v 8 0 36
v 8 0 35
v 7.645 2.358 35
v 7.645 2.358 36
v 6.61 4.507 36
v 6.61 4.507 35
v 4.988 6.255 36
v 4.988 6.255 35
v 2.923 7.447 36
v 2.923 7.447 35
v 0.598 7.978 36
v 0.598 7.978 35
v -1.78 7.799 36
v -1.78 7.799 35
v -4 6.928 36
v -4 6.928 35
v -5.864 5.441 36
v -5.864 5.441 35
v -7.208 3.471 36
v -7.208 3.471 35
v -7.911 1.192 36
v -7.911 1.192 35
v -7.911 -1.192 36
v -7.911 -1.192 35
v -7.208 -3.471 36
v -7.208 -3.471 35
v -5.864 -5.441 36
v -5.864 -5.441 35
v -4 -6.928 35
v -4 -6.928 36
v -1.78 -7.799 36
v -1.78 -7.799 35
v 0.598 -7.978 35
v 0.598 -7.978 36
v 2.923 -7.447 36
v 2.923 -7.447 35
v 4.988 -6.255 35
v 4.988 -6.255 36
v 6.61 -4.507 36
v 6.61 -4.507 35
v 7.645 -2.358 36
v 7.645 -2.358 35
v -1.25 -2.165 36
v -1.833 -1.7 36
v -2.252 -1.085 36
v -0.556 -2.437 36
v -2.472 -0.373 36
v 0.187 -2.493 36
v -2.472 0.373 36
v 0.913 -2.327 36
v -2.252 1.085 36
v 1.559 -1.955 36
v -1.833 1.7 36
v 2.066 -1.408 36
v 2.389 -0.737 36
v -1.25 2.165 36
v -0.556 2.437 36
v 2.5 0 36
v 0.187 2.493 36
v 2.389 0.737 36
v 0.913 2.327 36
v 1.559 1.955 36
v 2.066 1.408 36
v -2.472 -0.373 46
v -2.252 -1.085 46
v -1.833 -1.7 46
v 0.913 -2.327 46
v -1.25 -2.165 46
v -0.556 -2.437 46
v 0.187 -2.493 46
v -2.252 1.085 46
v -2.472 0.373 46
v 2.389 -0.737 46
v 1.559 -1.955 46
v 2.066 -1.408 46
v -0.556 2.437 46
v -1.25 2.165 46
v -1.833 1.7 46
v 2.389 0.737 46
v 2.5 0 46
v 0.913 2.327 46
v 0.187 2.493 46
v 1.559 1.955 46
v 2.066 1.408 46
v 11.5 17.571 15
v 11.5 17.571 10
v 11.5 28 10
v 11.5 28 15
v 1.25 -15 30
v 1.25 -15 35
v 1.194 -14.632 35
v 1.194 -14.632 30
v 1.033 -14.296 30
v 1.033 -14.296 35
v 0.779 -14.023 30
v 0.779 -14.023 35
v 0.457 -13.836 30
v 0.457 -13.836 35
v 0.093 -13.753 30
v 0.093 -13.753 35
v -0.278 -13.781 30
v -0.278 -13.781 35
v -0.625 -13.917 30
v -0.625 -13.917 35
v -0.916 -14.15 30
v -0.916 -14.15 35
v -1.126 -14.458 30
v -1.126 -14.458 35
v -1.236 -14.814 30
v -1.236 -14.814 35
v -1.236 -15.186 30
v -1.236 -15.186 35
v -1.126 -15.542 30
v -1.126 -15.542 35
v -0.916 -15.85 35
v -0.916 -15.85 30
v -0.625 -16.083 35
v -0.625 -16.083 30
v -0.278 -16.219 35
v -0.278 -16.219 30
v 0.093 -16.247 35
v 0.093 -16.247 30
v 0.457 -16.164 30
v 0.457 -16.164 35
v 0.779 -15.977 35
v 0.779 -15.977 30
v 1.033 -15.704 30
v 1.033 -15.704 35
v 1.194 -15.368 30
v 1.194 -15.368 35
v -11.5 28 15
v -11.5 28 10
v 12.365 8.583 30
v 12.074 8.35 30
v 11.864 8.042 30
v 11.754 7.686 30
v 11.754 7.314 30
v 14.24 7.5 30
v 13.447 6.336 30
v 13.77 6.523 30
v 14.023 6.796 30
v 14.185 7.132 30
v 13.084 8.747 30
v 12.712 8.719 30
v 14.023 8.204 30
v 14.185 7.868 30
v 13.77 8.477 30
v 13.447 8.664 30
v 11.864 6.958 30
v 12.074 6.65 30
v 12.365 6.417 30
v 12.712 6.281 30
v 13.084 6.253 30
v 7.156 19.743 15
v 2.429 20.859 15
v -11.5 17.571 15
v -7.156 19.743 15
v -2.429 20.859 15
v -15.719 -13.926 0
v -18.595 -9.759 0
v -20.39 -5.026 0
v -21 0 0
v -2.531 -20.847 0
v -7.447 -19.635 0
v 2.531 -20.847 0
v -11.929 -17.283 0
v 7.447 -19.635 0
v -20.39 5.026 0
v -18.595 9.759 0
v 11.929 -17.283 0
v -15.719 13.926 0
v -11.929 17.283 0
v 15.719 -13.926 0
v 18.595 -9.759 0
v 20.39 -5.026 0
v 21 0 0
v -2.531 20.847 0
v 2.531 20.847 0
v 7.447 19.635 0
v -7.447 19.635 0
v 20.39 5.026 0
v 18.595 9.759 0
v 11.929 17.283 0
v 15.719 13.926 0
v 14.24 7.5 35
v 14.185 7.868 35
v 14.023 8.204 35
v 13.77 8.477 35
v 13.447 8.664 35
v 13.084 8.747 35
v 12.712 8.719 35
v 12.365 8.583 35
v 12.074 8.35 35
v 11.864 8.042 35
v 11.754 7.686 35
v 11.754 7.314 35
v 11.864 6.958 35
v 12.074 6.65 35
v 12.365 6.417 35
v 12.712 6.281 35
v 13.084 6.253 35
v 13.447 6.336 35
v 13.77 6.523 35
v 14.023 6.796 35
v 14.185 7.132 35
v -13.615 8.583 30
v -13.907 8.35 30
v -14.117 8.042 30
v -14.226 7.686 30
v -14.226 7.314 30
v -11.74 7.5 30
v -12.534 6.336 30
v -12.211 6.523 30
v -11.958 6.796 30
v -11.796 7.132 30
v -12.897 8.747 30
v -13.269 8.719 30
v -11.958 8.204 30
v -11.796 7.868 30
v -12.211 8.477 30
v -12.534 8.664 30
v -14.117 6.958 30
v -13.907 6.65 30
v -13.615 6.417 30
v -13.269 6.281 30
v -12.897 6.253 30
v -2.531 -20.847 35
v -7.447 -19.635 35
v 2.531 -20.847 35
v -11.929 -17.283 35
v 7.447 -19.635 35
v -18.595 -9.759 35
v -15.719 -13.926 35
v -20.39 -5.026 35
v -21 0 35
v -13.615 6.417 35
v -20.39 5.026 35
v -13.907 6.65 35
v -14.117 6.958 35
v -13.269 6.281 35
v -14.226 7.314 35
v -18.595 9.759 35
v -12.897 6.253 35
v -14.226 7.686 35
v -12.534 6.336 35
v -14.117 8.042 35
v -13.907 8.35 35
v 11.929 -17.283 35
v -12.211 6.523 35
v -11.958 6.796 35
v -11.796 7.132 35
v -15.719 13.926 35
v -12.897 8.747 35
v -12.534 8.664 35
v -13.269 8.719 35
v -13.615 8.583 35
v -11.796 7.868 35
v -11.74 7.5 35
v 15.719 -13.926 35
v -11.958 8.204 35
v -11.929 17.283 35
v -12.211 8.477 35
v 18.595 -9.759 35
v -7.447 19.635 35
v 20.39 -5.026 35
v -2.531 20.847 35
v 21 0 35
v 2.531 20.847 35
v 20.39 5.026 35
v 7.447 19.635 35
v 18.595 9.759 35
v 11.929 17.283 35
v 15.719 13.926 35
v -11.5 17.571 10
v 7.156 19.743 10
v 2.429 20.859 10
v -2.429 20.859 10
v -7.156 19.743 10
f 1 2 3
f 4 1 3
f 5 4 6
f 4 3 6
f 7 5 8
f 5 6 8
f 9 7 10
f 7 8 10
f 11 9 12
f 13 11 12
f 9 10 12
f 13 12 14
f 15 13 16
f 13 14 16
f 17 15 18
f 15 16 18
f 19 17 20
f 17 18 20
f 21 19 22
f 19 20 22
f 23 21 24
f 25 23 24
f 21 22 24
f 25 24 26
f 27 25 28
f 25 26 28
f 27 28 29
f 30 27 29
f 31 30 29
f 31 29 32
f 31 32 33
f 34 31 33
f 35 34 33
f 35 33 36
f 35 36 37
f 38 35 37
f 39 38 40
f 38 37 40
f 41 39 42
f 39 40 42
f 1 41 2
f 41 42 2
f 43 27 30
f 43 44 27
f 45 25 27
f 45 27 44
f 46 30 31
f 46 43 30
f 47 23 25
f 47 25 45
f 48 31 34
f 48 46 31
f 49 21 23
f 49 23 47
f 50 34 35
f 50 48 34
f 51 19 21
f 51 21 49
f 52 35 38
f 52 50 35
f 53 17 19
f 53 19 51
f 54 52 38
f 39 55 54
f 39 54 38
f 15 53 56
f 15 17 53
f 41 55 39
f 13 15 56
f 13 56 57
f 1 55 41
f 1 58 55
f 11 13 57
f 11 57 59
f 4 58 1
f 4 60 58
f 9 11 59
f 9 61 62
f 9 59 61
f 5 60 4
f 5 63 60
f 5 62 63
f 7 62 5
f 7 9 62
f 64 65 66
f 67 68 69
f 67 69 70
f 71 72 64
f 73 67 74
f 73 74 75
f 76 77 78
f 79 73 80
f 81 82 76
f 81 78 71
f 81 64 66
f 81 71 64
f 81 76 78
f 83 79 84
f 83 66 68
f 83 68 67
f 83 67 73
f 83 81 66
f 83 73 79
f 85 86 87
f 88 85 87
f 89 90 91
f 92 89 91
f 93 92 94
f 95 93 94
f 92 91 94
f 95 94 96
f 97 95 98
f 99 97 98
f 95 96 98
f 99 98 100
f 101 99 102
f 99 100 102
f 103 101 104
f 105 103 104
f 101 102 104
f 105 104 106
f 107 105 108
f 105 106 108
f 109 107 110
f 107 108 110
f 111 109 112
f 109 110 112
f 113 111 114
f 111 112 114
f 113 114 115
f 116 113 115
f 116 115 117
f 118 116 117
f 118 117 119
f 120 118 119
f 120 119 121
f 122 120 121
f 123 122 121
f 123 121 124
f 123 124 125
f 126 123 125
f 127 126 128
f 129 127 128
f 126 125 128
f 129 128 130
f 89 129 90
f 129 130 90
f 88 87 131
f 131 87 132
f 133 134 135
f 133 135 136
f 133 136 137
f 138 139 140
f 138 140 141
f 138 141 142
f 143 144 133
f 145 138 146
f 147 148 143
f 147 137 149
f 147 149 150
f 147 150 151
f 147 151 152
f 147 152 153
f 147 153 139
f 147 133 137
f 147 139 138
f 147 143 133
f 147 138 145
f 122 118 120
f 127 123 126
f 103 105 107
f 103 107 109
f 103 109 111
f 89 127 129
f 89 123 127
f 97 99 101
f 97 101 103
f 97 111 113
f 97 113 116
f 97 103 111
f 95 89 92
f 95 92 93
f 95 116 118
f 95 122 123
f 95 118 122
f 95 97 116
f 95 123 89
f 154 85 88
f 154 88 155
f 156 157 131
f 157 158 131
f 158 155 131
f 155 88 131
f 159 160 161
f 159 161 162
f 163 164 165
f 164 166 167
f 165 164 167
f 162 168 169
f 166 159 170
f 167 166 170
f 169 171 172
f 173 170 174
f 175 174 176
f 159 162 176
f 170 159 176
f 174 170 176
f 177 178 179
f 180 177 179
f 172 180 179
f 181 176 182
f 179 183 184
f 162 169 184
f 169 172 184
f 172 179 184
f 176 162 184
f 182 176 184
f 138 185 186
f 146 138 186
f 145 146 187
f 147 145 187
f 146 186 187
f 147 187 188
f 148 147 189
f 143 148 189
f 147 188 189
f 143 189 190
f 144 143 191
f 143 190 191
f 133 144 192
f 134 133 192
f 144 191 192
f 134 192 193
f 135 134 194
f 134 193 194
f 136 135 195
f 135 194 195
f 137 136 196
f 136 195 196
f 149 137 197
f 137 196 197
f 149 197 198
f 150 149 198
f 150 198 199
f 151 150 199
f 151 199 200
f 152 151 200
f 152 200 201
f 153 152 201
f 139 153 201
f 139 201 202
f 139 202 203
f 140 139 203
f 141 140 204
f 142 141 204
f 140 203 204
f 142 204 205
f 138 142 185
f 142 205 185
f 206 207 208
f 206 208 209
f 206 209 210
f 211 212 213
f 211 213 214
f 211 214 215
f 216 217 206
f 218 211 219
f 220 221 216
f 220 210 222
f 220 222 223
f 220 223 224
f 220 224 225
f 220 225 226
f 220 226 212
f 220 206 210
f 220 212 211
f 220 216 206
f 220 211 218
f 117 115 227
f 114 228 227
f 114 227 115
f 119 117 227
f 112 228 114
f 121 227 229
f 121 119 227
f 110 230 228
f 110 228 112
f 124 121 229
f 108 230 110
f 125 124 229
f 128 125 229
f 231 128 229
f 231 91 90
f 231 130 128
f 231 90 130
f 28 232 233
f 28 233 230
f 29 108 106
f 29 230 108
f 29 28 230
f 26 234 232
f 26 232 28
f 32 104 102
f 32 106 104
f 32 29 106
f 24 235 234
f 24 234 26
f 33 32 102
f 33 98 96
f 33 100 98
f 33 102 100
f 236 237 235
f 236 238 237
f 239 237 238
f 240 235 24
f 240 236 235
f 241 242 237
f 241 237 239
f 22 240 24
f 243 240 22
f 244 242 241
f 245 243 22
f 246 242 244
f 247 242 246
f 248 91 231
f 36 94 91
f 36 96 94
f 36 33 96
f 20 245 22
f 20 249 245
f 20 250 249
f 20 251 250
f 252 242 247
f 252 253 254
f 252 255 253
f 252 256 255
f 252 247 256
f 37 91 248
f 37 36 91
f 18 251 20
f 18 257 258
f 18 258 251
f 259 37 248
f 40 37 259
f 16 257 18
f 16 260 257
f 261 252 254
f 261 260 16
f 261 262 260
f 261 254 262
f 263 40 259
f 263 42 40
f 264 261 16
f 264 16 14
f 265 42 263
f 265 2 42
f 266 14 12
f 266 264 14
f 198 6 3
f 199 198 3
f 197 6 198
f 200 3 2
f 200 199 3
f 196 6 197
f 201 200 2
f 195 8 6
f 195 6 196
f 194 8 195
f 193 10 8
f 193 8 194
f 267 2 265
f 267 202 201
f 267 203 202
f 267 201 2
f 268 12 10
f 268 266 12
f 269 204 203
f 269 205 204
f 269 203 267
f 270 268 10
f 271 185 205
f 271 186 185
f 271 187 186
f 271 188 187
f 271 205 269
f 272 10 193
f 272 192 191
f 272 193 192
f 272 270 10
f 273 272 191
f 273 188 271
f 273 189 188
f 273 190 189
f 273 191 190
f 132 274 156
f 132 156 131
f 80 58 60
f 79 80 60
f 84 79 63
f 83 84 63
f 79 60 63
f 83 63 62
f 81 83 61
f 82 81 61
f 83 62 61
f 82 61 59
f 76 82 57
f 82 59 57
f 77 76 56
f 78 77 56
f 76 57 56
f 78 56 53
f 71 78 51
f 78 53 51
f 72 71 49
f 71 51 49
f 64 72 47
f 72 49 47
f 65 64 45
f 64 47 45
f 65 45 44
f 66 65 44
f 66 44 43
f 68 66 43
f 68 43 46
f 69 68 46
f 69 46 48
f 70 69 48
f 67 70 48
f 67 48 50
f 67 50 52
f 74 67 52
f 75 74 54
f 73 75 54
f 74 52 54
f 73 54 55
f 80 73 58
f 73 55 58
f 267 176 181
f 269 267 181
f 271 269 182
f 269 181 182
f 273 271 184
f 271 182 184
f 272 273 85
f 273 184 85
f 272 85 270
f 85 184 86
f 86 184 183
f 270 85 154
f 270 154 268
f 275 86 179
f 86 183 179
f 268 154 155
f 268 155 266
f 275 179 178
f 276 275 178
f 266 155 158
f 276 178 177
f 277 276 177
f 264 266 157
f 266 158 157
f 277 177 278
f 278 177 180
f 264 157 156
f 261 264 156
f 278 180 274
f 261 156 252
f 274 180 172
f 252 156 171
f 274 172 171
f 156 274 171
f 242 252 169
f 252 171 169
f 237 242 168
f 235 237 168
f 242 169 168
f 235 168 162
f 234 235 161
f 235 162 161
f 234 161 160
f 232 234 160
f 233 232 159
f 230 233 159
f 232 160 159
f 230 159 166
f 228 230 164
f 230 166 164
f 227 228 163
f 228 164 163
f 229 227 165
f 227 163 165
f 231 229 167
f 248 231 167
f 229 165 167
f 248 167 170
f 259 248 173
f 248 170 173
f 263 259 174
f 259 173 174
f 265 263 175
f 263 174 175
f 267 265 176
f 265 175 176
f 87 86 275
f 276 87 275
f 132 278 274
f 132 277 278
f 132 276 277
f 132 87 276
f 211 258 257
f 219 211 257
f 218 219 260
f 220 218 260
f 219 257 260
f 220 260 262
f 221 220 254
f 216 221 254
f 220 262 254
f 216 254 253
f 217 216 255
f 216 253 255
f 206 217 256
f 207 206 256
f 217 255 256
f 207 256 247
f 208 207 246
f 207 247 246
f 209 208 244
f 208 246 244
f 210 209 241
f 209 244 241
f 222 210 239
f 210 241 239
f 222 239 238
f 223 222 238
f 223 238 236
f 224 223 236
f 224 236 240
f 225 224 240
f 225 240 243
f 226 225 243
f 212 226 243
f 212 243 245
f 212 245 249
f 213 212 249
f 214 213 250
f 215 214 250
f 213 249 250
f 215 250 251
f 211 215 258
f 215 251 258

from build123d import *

# Parameters (mm, degrees)
SKETCH1_R           = 21
BOSS_EXTRUDE1_DEPTH = 35
SKETCH2_R           = 8
BOSS_EXTRUDE2_DEPTH = 1
SKETCH3_R           = 2.5
BOSS_EXTRUDE3_DEPTH = 10
BOSS_EXTRUDE4_START = -10
SKETCH4_W           = 23
SKETCH4_H           = 14.139392284
BOSS_EXTRUDE4_DEPTH = 5
SKETCH6_R           = 1.25
CUT_EXTRUDE1_DEPTH  = 5


with BuildPart() as part:
    # Sketch1 → Boss-Extrude1 (new body)
    with BuildSketch(Plane.XY):
        Circle(SKETCH1_R)
    extrude(amount=BOSS_EXTRUDE1_DEPTH)

    # Sketch2 → Boss-Extrude2 (add)
    with BuildSketch(Plane.XY.offset(35)):
        Circle(SKETCH2_R)
    extrude(amount=BOSS_EXTRUDE2_DEPTH)

    # Sketch3 → Boss-Extrude3 (add)
    with BuildSketch(Plane.XY.offset(36)):
        Circle(SKETCH3_R)
    extrude(amount=BOSS_EXTRUDE3_DEPTH)

    # Sketch4 → Boss-Extrude4 (add)
    with BuildSketch(Plane(origin=(0, 0, 0), x_dir=(-1, 0, 0), z_dir=(0, 0, -1)).offset(BOSS_EXTRUDE4_START)):
        with Locations((0, 20.930303858)):
            Rectangle(SKETCH4_W, SKETCH4_H)
    extrude(amount=-BOSS_EXTRUDE4_DEPTH)

    # Sketch6 → Cut-Extrude1 (cut)
    with BuildSketch(Plane.XY.offset(35)):
        with Locations((0, -15)):
            Circle(SKETCH6_R)
        with Locations((-12.990381057, 7.5)):
            Circle(SKETCH6_R)
        with Locations((12.990381057, 7.5)):
            Circle(SKETCH6_R)
    extrude(amount=-CUT_EXTRUDE1_DEPTH, mode=Mode.SUBTRACT)


solid = part.part
